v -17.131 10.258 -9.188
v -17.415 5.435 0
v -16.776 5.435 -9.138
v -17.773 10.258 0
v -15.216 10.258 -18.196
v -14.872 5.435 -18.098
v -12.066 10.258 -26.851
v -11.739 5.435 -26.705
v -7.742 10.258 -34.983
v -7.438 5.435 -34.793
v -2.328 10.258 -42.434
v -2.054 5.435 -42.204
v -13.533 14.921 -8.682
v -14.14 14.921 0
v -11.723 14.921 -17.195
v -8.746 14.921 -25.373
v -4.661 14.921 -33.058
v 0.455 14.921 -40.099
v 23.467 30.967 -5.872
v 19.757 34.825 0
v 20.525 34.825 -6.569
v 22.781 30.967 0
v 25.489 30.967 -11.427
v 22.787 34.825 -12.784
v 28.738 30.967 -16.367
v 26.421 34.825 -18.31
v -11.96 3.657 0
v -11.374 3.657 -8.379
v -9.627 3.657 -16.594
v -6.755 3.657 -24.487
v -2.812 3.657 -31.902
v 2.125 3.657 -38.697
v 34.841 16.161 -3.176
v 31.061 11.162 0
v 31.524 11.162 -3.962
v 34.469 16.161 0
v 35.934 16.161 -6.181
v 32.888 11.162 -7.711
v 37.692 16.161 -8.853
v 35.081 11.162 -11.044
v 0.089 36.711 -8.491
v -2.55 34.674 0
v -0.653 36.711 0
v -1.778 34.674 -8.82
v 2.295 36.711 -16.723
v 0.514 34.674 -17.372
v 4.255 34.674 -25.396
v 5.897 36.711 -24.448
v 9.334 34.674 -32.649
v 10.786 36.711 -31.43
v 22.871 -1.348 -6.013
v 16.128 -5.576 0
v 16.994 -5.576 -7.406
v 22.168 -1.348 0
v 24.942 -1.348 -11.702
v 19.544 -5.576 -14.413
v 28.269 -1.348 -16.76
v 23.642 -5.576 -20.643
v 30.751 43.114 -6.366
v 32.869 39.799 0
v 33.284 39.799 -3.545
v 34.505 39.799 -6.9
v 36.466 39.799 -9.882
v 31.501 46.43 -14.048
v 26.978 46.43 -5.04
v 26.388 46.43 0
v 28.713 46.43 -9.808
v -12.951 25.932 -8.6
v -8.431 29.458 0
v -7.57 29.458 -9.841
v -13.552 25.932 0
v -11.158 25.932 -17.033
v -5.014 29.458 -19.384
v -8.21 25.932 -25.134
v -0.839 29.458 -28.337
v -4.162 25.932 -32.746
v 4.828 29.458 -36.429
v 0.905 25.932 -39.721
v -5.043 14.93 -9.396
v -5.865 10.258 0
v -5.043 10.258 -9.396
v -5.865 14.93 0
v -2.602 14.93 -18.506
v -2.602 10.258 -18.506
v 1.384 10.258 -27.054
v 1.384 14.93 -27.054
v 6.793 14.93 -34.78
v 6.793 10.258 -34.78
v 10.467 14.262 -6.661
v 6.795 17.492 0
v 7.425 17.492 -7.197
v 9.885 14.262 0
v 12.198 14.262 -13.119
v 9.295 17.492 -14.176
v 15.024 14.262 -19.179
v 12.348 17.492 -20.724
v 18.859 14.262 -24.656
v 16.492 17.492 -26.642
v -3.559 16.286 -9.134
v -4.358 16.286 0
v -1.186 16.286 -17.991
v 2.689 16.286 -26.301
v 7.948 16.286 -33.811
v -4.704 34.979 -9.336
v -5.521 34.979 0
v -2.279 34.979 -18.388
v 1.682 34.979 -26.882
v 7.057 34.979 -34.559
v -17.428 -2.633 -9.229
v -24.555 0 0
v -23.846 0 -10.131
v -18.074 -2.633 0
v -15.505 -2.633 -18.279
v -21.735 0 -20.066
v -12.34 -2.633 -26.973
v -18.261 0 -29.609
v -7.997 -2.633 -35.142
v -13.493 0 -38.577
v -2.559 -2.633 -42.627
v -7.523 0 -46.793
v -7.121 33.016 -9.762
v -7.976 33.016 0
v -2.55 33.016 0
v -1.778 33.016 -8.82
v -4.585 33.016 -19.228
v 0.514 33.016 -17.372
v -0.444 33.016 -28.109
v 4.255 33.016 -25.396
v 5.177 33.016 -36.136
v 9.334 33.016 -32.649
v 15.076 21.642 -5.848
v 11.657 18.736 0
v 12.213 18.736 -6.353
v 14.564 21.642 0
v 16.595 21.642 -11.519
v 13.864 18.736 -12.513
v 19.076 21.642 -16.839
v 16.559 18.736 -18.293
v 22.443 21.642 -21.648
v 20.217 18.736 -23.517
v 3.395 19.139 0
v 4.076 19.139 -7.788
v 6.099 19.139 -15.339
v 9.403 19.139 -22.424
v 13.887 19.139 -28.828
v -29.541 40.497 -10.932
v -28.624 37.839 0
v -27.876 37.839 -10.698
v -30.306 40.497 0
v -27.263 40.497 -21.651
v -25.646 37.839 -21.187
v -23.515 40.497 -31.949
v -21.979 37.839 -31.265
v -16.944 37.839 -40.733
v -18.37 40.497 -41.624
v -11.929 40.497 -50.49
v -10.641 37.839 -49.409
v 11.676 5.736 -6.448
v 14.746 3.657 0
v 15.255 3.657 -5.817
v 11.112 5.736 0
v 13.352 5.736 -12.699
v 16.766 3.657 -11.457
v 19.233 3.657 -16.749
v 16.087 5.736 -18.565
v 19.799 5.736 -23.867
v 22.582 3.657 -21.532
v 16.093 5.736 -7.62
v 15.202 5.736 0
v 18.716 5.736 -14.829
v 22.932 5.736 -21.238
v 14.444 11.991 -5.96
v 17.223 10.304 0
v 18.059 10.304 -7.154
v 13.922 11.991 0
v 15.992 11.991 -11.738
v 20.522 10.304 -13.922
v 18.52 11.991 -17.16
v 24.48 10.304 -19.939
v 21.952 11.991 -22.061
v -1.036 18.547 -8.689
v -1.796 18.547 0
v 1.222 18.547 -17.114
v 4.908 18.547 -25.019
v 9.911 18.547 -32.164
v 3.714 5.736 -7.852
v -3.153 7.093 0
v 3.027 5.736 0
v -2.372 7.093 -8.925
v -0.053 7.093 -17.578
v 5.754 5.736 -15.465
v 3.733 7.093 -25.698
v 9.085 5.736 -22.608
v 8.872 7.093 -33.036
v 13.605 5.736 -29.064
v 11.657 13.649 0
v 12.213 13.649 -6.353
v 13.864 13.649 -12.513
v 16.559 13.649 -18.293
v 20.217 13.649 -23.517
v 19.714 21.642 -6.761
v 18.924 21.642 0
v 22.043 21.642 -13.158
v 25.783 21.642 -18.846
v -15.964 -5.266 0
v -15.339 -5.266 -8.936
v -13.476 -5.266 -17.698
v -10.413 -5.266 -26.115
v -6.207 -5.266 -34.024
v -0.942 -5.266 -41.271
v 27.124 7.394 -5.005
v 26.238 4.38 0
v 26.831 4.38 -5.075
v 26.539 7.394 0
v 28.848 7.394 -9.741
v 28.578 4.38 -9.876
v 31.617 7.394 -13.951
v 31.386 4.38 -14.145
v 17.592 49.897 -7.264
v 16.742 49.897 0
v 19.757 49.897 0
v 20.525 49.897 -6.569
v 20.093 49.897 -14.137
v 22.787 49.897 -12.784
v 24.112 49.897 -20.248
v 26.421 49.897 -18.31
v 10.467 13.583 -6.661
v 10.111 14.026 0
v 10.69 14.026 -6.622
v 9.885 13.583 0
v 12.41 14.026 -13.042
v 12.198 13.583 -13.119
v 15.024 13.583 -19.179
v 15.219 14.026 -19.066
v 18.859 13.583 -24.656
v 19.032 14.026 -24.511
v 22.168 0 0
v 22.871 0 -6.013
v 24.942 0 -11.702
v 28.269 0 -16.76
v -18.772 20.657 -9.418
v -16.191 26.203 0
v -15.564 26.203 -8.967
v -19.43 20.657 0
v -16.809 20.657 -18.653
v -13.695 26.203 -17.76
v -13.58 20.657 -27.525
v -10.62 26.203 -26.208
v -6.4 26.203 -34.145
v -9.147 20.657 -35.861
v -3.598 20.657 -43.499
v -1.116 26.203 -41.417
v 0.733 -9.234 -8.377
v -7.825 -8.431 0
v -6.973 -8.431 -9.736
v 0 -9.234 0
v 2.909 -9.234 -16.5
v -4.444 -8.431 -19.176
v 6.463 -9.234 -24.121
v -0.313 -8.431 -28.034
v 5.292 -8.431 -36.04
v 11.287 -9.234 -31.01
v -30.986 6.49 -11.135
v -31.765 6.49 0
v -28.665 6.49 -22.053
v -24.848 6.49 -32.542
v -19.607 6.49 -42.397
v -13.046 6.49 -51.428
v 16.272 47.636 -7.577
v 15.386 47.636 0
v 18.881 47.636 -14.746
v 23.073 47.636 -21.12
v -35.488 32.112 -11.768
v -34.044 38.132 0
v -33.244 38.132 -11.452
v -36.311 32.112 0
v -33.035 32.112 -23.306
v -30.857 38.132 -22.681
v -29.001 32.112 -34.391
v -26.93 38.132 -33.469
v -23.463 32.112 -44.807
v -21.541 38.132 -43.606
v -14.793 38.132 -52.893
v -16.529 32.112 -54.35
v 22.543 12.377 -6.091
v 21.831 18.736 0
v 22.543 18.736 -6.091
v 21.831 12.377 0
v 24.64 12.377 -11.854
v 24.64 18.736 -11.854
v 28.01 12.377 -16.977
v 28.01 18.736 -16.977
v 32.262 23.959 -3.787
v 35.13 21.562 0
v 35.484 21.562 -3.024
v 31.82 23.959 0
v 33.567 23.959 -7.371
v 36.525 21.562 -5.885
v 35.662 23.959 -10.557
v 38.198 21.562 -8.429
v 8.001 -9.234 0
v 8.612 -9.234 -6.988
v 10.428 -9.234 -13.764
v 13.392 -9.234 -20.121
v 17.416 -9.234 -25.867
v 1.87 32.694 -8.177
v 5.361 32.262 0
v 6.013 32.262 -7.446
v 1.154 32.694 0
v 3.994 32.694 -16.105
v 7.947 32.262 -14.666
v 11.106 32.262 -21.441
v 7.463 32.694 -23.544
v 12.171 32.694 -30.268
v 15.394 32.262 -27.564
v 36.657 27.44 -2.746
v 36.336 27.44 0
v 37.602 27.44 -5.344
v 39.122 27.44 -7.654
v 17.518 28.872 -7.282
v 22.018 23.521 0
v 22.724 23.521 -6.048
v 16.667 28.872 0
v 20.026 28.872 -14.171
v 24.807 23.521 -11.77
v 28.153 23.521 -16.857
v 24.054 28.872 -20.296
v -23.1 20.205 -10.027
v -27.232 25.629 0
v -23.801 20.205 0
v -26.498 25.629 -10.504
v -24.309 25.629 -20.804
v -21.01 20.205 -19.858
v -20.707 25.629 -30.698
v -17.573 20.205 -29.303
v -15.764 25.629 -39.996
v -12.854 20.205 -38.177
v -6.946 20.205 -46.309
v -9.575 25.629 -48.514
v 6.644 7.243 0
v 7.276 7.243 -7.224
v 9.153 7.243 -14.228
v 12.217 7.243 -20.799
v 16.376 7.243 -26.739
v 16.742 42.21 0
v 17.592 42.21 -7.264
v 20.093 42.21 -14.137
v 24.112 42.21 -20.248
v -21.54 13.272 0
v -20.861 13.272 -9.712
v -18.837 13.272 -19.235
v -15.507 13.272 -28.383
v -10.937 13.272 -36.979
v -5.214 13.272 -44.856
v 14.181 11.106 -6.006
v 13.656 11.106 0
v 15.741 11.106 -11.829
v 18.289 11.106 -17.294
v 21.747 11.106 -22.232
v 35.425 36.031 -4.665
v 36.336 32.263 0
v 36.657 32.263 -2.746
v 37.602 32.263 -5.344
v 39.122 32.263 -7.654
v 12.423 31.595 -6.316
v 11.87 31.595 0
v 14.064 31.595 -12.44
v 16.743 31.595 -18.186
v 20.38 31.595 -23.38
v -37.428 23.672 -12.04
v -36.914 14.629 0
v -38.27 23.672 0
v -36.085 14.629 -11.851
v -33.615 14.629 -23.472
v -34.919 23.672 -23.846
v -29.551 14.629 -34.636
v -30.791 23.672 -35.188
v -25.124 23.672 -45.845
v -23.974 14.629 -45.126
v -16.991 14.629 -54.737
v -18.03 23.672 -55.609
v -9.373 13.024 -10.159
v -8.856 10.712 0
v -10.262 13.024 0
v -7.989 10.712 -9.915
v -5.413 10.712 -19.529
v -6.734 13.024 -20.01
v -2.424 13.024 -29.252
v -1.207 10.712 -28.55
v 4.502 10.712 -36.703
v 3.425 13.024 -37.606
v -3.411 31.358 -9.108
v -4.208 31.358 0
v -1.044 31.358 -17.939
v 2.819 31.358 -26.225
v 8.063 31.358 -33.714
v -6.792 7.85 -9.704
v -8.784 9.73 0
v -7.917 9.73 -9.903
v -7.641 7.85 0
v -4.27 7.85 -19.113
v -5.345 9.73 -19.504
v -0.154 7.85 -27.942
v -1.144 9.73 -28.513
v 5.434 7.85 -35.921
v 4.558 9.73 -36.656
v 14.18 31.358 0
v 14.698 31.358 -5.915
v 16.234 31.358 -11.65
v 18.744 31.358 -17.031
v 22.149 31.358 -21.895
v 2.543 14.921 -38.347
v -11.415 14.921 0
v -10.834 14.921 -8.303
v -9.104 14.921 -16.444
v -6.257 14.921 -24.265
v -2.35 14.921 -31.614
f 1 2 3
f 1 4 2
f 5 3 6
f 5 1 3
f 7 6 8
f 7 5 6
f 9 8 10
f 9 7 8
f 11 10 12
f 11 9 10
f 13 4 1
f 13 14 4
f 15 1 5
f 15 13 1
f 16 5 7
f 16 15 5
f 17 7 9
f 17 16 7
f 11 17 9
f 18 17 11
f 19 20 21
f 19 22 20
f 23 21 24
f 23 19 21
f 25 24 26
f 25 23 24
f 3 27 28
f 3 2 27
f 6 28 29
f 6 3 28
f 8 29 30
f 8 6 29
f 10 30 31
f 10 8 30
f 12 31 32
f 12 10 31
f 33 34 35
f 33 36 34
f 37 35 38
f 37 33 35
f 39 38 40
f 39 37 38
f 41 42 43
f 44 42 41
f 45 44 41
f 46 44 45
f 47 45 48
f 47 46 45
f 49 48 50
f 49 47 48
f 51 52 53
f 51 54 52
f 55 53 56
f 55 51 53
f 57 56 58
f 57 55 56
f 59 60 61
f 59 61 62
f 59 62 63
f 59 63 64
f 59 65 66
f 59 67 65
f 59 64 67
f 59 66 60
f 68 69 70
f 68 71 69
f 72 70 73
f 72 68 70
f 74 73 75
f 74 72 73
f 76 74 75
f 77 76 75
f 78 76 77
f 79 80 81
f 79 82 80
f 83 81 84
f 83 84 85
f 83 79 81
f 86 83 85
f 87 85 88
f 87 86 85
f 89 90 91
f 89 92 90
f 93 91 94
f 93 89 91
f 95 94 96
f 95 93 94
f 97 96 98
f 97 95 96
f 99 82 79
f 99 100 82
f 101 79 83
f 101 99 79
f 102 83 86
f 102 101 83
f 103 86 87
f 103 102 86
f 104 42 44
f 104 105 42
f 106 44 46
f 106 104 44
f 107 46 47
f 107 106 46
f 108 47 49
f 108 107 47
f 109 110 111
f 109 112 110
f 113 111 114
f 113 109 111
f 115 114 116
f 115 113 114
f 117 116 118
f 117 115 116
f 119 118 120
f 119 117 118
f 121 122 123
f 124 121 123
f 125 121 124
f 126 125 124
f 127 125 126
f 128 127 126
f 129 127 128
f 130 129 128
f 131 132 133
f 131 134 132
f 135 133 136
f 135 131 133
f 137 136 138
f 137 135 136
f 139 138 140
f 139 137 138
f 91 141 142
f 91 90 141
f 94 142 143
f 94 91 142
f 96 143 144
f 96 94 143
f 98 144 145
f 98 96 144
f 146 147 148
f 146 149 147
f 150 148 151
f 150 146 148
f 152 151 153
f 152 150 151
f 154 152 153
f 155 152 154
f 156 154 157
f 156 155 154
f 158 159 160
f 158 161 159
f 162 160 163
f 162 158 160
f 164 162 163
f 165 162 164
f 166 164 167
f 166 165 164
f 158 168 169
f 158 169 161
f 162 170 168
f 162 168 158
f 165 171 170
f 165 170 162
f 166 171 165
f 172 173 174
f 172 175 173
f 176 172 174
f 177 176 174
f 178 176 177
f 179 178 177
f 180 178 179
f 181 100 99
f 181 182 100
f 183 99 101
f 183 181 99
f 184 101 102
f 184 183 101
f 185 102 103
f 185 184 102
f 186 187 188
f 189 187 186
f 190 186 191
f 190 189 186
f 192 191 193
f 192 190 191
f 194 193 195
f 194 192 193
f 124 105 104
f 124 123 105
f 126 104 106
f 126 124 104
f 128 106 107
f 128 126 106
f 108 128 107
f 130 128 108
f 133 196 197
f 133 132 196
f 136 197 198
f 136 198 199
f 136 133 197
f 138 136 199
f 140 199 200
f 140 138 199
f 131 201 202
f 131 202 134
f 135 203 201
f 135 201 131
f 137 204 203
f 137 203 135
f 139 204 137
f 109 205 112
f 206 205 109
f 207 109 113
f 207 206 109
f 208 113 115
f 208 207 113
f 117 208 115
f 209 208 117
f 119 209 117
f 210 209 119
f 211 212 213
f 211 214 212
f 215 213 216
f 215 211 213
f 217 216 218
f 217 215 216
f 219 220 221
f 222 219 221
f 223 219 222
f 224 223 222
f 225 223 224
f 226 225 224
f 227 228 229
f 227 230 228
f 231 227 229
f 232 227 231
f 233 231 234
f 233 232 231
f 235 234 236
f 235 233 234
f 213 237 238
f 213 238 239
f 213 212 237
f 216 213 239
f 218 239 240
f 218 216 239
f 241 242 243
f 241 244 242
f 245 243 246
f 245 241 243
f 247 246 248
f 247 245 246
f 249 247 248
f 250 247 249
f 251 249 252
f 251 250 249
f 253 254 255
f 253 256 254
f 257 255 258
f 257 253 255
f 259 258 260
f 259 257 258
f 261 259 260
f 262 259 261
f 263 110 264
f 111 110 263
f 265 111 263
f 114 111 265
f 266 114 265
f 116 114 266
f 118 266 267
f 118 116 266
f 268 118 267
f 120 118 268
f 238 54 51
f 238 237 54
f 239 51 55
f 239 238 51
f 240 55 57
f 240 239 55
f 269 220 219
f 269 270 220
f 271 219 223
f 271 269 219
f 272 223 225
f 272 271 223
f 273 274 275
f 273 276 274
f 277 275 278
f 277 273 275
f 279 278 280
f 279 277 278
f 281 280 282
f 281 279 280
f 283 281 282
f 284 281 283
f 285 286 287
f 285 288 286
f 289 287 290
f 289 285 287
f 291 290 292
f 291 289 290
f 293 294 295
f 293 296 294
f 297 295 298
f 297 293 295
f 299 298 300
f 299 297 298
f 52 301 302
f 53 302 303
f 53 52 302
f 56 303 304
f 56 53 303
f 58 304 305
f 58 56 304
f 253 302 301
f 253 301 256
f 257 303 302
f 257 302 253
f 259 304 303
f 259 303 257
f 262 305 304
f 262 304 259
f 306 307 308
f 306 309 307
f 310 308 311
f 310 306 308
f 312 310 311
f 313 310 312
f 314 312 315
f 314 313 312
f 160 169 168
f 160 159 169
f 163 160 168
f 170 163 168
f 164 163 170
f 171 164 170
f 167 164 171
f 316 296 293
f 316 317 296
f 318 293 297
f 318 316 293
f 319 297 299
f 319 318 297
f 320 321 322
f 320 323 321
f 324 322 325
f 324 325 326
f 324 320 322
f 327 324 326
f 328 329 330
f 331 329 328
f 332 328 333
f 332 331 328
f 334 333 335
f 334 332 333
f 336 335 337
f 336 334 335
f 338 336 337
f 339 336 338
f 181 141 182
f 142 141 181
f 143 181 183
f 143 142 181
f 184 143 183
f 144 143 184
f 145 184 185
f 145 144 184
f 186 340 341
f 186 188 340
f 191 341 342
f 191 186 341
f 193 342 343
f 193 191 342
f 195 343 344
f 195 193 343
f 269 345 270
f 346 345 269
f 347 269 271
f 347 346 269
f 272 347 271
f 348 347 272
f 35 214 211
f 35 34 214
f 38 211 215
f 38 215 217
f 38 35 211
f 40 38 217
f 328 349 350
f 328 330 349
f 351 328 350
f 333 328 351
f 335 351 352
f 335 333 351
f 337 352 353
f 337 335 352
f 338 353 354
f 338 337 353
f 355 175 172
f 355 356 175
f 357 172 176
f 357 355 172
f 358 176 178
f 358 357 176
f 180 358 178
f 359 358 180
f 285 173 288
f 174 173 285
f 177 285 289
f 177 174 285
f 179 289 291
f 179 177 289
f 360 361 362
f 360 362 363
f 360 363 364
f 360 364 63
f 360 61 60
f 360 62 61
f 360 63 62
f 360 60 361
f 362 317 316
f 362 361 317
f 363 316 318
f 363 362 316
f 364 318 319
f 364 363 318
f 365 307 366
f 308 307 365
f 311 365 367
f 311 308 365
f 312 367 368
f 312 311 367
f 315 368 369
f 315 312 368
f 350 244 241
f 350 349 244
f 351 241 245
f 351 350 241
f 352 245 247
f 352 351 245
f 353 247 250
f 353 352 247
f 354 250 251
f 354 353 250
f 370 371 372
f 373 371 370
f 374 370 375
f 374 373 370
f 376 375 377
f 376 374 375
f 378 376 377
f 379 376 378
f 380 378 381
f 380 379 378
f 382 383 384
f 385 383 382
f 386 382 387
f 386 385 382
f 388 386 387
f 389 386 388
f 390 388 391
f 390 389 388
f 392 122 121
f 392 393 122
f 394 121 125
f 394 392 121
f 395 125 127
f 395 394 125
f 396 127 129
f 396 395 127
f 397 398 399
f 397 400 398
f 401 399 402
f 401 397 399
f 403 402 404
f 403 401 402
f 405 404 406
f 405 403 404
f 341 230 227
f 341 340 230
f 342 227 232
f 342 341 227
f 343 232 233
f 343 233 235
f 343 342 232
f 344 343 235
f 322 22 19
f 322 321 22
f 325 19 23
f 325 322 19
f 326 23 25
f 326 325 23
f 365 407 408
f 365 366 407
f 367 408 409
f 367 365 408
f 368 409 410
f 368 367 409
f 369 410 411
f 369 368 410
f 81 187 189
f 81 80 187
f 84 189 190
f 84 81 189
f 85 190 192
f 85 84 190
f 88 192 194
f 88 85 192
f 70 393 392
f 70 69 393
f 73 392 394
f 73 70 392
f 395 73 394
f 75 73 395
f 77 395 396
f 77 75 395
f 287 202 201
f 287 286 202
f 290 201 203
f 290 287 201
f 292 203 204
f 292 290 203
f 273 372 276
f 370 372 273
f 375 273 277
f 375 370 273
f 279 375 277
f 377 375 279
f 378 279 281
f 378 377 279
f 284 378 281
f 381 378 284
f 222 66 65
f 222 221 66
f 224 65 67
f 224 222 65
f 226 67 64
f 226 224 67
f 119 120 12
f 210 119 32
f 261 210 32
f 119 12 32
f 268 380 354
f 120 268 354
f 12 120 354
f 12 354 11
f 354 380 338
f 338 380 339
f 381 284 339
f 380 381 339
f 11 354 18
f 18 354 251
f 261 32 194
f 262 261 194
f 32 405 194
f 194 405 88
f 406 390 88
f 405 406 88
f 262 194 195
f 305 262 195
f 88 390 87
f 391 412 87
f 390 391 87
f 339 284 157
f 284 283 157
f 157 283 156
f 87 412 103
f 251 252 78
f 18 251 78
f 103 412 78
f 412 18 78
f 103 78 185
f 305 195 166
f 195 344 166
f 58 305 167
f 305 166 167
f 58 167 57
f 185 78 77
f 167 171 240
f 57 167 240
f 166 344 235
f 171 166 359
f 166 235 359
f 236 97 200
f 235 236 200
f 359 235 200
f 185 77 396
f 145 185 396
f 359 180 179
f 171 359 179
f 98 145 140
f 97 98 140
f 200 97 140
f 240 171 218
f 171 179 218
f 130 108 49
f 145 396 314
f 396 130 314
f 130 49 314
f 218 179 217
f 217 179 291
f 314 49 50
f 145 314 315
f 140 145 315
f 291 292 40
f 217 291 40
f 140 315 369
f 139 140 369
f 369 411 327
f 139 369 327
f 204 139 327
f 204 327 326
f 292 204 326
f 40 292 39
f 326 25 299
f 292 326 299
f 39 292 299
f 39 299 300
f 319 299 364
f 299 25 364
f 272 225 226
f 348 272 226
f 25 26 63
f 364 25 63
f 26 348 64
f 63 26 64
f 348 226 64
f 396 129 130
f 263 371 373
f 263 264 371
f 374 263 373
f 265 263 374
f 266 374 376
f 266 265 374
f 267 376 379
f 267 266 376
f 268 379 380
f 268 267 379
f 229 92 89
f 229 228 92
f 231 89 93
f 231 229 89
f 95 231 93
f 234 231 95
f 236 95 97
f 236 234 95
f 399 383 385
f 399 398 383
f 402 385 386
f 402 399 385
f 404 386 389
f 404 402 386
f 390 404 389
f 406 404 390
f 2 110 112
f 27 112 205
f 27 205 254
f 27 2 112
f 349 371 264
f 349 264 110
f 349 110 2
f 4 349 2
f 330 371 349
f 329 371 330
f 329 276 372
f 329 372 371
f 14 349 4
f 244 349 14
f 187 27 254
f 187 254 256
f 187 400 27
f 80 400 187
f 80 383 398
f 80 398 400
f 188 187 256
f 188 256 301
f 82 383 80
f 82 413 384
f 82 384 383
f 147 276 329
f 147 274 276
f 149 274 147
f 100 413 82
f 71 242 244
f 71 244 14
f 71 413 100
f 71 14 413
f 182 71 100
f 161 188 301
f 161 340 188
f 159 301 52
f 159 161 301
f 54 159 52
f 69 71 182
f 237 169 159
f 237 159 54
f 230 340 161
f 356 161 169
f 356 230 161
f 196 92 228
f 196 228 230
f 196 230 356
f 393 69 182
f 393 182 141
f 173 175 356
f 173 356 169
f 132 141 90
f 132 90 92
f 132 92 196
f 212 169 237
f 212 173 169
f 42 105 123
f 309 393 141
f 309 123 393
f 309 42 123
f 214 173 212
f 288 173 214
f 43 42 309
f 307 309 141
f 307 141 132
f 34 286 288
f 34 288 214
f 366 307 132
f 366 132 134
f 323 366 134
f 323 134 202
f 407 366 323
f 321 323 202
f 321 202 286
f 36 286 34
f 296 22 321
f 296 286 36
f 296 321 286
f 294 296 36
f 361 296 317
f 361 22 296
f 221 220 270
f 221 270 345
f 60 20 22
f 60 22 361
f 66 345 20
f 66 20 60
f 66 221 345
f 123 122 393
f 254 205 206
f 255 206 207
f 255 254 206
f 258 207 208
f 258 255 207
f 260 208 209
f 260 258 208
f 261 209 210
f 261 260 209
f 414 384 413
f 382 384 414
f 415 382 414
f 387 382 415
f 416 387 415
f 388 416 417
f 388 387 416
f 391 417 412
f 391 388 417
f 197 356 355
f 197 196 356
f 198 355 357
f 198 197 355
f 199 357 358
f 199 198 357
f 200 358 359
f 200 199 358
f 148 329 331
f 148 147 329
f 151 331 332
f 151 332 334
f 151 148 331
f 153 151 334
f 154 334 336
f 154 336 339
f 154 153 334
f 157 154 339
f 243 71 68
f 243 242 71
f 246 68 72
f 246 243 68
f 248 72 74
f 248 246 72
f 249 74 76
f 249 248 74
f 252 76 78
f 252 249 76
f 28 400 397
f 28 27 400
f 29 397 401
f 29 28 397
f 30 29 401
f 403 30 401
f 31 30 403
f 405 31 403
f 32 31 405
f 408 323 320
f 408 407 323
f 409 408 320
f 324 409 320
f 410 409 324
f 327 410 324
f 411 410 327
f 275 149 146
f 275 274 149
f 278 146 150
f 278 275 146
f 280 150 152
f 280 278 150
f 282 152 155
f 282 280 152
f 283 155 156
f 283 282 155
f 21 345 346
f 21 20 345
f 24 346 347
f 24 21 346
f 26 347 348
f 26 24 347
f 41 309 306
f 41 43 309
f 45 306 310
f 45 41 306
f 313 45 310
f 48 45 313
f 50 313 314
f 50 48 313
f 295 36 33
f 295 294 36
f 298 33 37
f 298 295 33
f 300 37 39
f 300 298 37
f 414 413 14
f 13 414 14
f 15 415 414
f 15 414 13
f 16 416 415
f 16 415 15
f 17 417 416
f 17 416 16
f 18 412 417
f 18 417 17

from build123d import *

# Parameters (mm, degrees)
F1_ANGLE = 40


with BuildPart() as f1:
    # F0 (on Top) → F1 (revolve)
    with BuildSketch(Plane.XY):
        Polygon((28.799957, 21.561632), (28.799957, 12.819916), (35.130166, 21.561632), (31.819634, 23.958914), (36.335919, 27.439682), (36.335919, 32.262698), (32.869376, 39.798658), (26.38845, 46.430305), (19.756803, 49.896847), (16.742419, 49.896847), (15.385945, 47.636058), (16.742419, 42.210165), (19.756803, 34.824926), (22.780804, 30.966716), (24.12766, 29.248312), align=None)
        Polygon((35.130166, 21.561632), (28.799957, 12.819916), (28.799957, 21.561632), (24.12766, 29.248312), (22.780804, 30.966716), (22.017591, 23.520982), (16.667058, 28.871514), (14.180192, 31.35838), (11.870201, 31.595162), (5.361195, 32.262357), (1.154359, 32.693573), (-0.653343, 36.710685), (-2.549643, 34.674205), (-5.52113, 34.978793), (-2.549643, 33.016294), (-7.975536, 33.016294), (-4.207555, 31.35838), (-8.431453, 29.457625), (-13.552147, 25.932489), (-16.19102, 26.202983), (-19.430198, 20.657316), (-21.540266, 13.272074), (-21.540266, 6.489708), (-20.952175, 3.67613), (-20.183794, 0), (-18.073725, -2.633195), (-15.963655, -5.266391), (-7.824816, -8.431495), (0, -9.233566), (8.000703, -9.233566), (16.128225, -5.576178), (22.16831, -1.347692), (22.16831, 0), (26.23773, 4.379639), (26.539169, 7.394024), (31.060746, 11.162004), (34.469465, 16.161462), align=None)
        Polygon((-17.773023, 10.257689), (-14.139653, 14.920566), (-11.414627, 14.920566), (-10.262036, 13.024369), (-8.856477, 10.711998), (-8.783638, 9.730172), (-7.640627, 7.849735), (-11.959632, 3.657121), (-17.415215, 5.434674), align=None, mode=Mode.SUBTRACT)
        Polygon((14.745632, 3.657121), (11.112262, 5.736113), (15.201996, 5.736113), align=None, mode=Mode.SUBTRACT)
        Polygon((6.794949, 17.492212), (9.884694, 14.262024), (10.110772, 14.02567), (9.884694, 13.583343), (6.644229, 7.243304), (3.026968, 5.736113), (-3.152521, 7.092585), (-5.865466, 10.257689), (-5.865466, 14.929986), (-4.358274, 16.286459), (-1.796047, 18.547246), (3.394514, 19.138865), align=None, mode=Mode.SUBTRACT)
        Polygon((13.655621, 11.105528), (11.657268, 13.648886), (11.657268, 18.735604), (14.563963, 21.6423), (18.924005, 21.6423), (21.830701, 18.735605), (21.830701, 12.377207), (17.222896, 10.303694), (13.922315, 11.990658), align=None, mode=Mode.SUBTRACT)
        Polygon((-24.554653, 0), (-18.073725, -2.633195), (-20.183794, 0), (-20.952175, 3.67613), (-21.540266, 6.489708), (-21.540266, 13.272074), (-23.801055, 20.205159), (-27.232317, 25.628765), (-28.624071, 37.839308), (-30.305653, 40.497292), (-34.044402, 38.131959), (-36.310751, 32.111976), (-38.270105, 23.671702), (-36.91363, 14.628547), (-31.764652, 6.489844), align=None)
    revolve(axis=Axis((48.242737, 22.056726, 0), (0, -1, 0)), revolution_arc=F1_ANGLE)


solid = f1.part
